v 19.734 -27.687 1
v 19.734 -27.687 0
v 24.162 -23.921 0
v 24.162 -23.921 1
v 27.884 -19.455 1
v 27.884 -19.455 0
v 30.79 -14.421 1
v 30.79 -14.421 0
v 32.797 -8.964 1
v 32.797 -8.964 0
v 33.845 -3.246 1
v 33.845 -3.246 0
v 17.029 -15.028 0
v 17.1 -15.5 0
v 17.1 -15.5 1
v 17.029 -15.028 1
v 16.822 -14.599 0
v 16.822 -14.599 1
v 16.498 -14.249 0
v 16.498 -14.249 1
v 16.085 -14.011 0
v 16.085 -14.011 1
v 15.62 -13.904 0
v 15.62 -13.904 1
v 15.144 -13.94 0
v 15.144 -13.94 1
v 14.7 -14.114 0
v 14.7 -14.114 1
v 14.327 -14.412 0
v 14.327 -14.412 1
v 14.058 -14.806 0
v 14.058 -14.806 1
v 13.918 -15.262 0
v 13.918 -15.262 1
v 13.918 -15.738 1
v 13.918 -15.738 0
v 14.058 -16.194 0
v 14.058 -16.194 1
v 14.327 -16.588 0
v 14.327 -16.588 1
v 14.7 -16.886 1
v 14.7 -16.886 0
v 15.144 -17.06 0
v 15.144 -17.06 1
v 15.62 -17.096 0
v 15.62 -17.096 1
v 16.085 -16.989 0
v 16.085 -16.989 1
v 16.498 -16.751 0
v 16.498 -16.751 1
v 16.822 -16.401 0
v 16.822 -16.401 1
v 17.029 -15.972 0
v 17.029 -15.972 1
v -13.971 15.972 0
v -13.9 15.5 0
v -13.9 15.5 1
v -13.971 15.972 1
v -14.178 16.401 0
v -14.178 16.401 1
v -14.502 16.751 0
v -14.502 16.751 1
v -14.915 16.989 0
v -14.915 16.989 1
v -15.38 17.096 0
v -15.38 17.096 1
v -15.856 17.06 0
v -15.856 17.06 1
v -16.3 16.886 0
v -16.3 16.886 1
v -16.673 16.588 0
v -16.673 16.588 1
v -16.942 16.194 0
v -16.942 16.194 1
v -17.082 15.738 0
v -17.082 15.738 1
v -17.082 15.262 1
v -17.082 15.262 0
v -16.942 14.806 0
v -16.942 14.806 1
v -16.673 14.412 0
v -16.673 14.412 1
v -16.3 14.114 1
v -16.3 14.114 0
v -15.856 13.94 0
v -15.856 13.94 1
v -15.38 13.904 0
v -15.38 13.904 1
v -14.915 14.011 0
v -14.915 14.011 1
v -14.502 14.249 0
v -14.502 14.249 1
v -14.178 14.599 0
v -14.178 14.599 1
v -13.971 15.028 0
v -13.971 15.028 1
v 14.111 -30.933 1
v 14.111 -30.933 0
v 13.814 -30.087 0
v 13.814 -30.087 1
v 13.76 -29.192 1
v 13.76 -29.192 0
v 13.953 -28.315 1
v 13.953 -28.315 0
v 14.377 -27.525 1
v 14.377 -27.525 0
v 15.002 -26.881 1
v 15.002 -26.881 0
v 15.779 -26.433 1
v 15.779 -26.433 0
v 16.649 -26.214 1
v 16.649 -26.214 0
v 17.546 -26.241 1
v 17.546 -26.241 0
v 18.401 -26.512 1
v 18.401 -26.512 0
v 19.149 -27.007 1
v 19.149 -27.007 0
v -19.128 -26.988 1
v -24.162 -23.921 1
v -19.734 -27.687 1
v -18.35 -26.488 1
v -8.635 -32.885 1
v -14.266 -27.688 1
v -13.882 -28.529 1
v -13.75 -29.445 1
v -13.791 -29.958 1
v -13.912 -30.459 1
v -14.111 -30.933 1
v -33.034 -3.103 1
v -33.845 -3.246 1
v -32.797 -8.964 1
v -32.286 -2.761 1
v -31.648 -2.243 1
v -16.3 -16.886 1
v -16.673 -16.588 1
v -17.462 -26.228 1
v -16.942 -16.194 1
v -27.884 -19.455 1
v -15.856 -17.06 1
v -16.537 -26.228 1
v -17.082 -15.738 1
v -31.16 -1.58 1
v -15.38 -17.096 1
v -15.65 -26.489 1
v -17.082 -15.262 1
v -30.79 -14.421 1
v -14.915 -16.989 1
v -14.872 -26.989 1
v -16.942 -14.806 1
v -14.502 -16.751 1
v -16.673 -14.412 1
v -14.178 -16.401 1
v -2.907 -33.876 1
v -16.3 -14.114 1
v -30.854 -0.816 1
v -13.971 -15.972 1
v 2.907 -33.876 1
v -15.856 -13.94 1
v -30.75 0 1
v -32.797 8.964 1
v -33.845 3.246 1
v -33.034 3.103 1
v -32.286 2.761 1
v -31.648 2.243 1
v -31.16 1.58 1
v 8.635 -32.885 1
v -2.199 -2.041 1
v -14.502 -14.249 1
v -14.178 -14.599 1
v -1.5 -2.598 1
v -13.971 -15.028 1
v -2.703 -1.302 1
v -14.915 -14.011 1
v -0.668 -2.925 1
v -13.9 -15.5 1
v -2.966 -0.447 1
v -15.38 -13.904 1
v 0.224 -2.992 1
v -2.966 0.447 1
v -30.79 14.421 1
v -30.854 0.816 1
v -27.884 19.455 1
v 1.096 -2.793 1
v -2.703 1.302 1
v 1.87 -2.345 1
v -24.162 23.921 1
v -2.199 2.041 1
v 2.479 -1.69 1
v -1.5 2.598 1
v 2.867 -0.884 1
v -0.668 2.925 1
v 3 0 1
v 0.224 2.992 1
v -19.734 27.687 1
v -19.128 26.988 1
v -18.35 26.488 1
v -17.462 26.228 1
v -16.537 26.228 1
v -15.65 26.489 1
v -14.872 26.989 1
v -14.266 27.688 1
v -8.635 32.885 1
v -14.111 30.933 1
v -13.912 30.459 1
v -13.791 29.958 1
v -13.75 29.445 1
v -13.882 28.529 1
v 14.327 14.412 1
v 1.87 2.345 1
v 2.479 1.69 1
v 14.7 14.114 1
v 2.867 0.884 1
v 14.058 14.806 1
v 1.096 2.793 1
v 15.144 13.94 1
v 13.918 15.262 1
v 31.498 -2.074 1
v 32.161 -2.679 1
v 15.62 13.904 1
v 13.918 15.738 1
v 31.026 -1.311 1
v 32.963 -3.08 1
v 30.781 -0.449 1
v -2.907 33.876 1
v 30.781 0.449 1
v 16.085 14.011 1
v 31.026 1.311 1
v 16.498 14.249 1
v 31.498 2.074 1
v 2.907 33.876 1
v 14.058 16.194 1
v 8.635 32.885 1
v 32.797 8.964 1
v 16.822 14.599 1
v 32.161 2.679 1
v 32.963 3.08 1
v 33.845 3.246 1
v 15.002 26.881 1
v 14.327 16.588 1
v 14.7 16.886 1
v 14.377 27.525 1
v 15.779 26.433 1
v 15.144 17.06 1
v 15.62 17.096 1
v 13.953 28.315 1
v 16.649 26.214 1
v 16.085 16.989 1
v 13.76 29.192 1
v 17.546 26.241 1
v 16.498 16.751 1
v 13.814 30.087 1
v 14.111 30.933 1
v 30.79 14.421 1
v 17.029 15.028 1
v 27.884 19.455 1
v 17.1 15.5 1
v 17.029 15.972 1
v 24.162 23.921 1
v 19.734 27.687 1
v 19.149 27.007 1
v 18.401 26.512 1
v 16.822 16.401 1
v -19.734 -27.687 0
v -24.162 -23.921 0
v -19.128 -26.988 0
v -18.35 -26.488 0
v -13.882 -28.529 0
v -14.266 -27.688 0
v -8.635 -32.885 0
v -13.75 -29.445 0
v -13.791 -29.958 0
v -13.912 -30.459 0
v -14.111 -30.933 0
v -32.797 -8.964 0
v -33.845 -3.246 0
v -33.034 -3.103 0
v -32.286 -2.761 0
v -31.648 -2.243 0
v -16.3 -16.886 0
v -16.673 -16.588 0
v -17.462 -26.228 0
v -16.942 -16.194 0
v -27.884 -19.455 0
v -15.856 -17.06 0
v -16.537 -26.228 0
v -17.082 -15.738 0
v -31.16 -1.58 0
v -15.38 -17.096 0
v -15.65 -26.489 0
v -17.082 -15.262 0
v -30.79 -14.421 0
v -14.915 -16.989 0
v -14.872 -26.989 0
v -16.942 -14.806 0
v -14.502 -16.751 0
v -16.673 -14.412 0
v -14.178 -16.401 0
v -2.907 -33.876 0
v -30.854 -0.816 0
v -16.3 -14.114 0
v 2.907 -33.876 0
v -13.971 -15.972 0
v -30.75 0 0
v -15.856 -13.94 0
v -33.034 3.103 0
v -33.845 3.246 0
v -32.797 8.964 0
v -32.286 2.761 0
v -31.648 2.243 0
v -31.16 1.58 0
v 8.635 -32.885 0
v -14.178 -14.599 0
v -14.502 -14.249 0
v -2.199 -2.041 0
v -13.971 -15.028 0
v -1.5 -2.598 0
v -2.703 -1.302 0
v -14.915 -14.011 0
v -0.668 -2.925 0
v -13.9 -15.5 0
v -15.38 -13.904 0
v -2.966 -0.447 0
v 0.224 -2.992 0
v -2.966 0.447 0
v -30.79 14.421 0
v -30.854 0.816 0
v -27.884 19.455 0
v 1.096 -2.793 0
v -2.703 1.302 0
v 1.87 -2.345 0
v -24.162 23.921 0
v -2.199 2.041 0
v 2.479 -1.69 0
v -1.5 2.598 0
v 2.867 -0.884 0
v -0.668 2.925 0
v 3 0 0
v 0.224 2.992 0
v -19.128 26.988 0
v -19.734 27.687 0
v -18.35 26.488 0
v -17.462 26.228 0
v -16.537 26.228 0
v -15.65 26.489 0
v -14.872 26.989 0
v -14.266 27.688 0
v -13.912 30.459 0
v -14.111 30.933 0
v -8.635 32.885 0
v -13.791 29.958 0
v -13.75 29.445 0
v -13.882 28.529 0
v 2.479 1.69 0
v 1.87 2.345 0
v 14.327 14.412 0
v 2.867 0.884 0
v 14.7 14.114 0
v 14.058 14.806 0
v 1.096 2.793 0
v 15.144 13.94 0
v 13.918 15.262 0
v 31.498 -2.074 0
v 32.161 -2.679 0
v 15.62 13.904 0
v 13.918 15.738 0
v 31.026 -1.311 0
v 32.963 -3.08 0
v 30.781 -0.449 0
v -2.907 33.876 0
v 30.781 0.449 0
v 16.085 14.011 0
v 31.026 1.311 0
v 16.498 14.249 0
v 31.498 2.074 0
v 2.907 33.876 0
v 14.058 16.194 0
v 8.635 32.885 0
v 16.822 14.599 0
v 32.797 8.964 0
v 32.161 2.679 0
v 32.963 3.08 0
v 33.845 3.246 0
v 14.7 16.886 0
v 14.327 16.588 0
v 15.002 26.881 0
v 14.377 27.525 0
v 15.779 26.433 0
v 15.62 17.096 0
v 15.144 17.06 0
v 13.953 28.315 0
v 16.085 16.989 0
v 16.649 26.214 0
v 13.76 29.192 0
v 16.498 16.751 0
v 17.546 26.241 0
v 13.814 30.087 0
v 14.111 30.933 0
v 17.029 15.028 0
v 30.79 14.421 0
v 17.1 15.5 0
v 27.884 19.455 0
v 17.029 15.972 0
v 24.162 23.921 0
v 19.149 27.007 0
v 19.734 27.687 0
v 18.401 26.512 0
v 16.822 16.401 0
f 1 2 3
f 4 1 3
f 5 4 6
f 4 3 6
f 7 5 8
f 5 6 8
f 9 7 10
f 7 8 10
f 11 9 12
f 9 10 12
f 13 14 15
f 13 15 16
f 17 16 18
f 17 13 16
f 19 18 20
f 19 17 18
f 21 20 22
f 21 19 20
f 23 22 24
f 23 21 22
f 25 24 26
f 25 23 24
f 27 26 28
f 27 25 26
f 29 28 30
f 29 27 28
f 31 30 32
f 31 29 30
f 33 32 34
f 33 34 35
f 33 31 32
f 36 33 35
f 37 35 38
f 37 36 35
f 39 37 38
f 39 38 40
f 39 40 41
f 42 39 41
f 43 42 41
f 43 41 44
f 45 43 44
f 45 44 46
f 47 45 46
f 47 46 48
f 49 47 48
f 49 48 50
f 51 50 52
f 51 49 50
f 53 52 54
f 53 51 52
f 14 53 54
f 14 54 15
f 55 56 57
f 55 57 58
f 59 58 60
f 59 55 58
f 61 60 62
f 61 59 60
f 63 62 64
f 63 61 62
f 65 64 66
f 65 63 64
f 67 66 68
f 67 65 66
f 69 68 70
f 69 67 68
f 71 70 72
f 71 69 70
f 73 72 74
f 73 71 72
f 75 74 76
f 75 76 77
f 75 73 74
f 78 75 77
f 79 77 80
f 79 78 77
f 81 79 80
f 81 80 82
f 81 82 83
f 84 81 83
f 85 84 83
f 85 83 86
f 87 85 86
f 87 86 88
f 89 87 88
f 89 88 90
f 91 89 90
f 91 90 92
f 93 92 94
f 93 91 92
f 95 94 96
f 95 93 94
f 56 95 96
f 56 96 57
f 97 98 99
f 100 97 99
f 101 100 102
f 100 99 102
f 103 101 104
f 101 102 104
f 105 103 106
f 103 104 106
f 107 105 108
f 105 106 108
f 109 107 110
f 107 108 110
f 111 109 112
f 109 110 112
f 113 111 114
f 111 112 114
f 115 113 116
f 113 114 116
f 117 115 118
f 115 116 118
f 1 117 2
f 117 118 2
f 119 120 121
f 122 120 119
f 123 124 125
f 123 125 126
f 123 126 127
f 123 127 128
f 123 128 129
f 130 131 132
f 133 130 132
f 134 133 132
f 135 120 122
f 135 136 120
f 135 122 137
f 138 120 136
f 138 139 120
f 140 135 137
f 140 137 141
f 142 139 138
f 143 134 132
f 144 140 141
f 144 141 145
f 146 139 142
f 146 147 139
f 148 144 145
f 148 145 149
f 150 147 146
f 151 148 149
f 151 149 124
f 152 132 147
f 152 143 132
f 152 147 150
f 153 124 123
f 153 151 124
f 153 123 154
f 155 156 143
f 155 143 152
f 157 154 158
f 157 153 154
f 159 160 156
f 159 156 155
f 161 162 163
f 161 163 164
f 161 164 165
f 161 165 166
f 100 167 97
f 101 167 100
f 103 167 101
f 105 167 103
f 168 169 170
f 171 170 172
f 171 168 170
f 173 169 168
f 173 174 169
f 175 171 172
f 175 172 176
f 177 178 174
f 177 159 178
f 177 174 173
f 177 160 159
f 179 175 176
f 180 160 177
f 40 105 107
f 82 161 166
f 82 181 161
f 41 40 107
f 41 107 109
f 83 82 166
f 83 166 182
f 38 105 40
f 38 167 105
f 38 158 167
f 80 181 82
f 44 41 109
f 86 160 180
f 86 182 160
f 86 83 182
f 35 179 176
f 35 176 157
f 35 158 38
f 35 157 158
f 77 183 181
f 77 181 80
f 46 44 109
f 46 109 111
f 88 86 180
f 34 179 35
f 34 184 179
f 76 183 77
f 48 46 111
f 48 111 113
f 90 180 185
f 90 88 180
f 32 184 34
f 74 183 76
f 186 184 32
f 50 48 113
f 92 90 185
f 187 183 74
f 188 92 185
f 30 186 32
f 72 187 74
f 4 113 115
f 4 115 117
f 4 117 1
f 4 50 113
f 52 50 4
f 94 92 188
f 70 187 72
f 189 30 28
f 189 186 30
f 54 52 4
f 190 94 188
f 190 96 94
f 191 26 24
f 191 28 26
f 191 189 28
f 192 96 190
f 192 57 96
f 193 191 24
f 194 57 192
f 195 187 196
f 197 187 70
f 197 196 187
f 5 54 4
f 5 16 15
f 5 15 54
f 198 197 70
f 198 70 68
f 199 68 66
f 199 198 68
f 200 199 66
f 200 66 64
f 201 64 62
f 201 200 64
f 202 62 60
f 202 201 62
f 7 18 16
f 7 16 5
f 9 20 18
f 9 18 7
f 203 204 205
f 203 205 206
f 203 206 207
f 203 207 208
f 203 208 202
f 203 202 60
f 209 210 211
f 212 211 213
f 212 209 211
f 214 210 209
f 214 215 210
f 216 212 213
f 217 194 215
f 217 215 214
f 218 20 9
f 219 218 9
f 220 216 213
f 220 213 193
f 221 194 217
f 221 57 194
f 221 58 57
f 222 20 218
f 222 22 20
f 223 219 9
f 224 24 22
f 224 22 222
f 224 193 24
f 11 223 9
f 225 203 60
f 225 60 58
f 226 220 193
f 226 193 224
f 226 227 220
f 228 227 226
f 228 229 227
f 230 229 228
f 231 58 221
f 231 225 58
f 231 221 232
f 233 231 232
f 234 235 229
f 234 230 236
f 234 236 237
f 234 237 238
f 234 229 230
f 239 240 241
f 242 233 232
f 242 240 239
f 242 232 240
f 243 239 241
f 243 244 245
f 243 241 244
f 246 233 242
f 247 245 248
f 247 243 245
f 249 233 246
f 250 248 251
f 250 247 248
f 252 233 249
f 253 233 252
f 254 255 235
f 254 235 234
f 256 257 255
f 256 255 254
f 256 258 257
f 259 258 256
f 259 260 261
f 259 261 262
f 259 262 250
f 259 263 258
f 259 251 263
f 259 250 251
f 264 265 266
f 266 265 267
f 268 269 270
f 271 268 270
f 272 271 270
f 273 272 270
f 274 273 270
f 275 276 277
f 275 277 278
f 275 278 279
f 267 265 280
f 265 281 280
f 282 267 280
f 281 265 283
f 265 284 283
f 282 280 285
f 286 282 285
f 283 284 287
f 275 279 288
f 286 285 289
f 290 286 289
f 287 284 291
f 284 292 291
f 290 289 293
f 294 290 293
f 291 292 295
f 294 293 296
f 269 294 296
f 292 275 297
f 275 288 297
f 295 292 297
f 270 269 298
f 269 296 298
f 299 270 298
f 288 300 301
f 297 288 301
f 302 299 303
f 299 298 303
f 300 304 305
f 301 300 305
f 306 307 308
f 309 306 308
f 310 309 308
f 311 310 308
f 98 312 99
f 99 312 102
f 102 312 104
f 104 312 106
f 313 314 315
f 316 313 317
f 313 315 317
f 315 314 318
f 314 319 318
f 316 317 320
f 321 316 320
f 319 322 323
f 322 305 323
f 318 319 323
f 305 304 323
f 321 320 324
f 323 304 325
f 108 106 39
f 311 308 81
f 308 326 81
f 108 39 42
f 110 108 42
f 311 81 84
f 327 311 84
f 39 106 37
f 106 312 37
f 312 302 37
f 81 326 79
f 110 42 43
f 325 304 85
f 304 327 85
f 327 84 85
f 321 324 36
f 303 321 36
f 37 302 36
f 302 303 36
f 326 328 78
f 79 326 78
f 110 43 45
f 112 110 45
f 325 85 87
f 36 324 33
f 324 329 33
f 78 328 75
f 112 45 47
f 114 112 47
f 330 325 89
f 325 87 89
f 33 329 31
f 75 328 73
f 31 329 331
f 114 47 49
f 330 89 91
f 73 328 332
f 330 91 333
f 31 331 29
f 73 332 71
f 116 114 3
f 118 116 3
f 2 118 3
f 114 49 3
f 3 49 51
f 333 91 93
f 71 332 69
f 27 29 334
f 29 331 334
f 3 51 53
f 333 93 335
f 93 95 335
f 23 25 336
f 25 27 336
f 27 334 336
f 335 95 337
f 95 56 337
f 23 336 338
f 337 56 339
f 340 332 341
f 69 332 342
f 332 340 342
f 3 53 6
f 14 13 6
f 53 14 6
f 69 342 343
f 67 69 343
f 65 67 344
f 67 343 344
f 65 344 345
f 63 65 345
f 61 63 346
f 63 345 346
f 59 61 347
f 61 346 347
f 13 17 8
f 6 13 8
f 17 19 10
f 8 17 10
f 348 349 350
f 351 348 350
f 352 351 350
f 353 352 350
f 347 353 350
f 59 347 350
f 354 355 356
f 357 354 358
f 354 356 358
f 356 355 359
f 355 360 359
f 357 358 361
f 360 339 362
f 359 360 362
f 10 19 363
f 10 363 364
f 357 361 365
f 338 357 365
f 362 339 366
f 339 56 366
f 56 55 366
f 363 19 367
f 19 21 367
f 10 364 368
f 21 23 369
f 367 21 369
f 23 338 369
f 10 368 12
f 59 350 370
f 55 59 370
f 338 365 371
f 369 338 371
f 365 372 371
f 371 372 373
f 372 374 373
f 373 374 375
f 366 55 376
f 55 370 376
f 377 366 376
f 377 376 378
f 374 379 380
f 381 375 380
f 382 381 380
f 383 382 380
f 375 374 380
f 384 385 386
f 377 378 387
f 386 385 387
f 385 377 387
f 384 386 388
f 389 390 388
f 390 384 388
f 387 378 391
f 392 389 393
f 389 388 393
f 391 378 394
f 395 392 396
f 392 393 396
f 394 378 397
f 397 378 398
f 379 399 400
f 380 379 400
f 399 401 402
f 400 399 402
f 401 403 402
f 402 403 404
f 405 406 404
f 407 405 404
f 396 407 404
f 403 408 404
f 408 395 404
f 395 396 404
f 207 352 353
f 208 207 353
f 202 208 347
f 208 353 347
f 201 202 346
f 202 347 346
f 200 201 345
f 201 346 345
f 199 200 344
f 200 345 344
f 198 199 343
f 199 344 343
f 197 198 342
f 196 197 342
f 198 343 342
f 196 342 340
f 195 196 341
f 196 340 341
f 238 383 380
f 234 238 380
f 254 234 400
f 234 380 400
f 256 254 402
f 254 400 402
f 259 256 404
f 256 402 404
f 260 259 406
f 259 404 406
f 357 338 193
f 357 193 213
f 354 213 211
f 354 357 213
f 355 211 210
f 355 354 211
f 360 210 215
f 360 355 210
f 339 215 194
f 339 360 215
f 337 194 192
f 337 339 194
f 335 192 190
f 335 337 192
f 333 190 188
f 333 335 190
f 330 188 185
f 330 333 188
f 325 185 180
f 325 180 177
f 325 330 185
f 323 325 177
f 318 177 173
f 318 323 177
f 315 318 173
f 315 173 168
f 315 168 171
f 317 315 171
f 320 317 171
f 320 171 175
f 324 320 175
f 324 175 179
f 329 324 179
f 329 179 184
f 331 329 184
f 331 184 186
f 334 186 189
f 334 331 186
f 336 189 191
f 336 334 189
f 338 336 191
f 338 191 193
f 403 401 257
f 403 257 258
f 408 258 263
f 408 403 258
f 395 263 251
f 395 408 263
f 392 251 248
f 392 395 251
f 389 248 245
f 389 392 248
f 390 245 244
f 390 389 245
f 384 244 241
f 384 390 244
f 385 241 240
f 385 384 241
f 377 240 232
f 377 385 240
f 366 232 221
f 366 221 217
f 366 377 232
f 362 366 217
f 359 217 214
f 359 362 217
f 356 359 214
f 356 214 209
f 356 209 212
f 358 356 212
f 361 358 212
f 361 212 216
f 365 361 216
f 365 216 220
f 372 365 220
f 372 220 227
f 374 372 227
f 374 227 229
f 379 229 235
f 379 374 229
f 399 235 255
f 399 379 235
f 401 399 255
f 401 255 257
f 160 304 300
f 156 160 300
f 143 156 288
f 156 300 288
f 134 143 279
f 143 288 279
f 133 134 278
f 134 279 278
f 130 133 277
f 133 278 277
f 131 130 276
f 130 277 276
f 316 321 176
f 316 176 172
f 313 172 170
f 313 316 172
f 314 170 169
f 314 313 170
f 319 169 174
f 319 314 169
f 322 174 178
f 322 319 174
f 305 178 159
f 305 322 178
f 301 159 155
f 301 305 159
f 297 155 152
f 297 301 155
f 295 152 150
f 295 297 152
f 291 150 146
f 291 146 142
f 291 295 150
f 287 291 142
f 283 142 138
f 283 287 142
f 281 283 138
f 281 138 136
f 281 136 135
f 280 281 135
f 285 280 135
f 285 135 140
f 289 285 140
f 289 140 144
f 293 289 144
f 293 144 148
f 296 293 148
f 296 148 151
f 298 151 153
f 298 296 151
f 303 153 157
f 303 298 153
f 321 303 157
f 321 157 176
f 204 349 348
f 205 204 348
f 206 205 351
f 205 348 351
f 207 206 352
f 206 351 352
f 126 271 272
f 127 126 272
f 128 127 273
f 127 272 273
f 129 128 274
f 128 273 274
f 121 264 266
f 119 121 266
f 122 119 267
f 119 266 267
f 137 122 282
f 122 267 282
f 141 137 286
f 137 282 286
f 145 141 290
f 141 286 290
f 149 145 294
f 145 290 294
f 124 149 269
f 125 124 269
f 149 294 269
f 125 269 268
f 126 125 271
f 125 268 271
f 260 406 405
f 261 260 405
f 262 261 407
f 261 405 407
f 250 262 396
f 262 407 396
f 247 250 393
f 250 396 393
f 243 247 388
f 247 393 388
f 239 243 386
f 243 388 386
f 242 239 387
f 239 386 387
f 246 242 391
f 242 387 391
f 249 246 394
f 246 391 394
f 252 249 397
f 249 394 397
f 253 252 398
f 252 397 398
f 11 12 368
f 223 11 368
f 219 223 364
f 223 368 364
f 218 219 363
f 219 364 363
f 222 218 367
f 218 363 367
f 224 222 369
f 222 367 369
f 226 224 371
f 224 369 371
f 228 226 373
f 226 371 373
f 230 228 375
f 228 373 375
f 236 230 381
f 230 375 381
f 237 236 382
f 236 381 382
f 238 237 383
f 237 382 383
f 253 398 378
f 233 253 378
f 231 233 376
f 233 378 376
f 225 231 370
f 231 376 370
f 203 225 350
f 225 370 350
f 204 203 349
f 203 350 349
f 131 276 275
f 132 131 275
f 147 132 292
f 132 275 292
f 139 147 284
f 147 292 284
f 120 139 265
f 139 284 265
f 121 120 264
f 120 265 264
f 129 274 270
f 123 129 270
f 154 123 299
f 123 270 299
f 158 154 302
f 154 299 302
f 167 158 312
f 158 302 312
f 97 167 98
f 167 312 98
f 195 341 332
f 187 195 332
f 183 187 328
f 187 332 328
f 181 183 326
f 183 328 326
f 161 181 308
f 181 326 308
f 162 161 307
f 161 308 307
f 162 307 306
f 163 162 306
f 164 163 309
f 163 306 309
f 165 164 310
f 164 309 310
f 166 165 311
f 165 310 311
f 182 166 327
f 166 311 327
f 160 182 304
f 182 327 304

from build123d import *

# Parameters (mm, degrees)
ESQUISSE1_R        = 1.6
ESQUISSE1_R_2      = 3
BOSS_EXTRU_1_DEPTH = 1


with BuildPart() as part:
    # Esquisse1 → Boss.-Extru.1 (new body)
    with BuildSketch(Plane.XY):
        with BuildLine():
            ThreePointArc((33.844669118, -3.246285927), (30.75, 0), (33.844669118, 3.246285927))
            ThreePointArc((33.844669118, 3.246285927), (29.444863729, 17), (19.733700639, 27.687200275))
            ThreePointArc((19.733700639, 27.687200275), (15.375, 26.630281166), (14.110968478, 30.933486202))
            ThreePointArc((14.110968478, 30.933486202), (0, 34), (-14.110968478, 30.933486202))
            ThreePointArc((-14.110968478, 30.933486202), (-13.841531032, 30.210744775), (-13.75, 29.444863729))
            ThreePointArc((-13.75, 29.444863729), (-16.084037959, 26.326608842), (-19.733700639, 27.687200275))
            ThreePointArc((-19.733700639, 27.687200275), (-29.444863729, 17), (-33.844669118, 3.246285927))
            ThreePointArc((-33.844669118, 3.246285927), (-31.64762616, 2.242506927), (-30.75, 0))
            ThreePointArc((-30.75, 0), (-31.64762616, -2.242506927), (-33.844669118, -3.246285927))
            ThreePointArc((-33.844669118, -3.246285927), (-29.444863729, -17), (-19.733700639, -27.687200275))
            ThreePointArc((-19.733700639, -27.687200275), (-16.084037959, -26.326608842), (-13.75, -29.444863729))
            ThreePointArc((-13.75, -29.444863729), (-13.841531032, -30.210744775), (-14.110968478, -30.933486202))
            ThreePointArc((-14.110968478, -30.933486202), (0, -34), (14.110968478, -30.933486202))
            ThreePointArc((14.110968478, -30.933486202), (15.375, -26.630281166), (19.733700639, -27.687200275))
            ThreePointArc((19.733700639, -27.687200275), (29.444863729, -17), (33.844669118, -3.246285927))
        make_face()
        with Locations((-15.5, -15.5)):
            Circle(ESQUISSE1_R, mode=Mode.SUBTRACT)
        with Locations((15.5, -15.5)):
            Circle(ESQUISSE1_R, mode=Mode.SUBTRACT)
        with Locations((-15.5, 15.5)):
            Circle(ESQUISSE1_R, mode=Mode.SUBTRACT)
        Circle(ESQUISSE1_R_2, mode=Mode.SUBTRACT)
        with Locations((15.5, 15.5)):
            Circle(ESQUISSE1_R, mode=Mode.SUBTRACT)
    extrude(amount=BOSS_EXTRU_1_DEPTH)


solid = part.part
